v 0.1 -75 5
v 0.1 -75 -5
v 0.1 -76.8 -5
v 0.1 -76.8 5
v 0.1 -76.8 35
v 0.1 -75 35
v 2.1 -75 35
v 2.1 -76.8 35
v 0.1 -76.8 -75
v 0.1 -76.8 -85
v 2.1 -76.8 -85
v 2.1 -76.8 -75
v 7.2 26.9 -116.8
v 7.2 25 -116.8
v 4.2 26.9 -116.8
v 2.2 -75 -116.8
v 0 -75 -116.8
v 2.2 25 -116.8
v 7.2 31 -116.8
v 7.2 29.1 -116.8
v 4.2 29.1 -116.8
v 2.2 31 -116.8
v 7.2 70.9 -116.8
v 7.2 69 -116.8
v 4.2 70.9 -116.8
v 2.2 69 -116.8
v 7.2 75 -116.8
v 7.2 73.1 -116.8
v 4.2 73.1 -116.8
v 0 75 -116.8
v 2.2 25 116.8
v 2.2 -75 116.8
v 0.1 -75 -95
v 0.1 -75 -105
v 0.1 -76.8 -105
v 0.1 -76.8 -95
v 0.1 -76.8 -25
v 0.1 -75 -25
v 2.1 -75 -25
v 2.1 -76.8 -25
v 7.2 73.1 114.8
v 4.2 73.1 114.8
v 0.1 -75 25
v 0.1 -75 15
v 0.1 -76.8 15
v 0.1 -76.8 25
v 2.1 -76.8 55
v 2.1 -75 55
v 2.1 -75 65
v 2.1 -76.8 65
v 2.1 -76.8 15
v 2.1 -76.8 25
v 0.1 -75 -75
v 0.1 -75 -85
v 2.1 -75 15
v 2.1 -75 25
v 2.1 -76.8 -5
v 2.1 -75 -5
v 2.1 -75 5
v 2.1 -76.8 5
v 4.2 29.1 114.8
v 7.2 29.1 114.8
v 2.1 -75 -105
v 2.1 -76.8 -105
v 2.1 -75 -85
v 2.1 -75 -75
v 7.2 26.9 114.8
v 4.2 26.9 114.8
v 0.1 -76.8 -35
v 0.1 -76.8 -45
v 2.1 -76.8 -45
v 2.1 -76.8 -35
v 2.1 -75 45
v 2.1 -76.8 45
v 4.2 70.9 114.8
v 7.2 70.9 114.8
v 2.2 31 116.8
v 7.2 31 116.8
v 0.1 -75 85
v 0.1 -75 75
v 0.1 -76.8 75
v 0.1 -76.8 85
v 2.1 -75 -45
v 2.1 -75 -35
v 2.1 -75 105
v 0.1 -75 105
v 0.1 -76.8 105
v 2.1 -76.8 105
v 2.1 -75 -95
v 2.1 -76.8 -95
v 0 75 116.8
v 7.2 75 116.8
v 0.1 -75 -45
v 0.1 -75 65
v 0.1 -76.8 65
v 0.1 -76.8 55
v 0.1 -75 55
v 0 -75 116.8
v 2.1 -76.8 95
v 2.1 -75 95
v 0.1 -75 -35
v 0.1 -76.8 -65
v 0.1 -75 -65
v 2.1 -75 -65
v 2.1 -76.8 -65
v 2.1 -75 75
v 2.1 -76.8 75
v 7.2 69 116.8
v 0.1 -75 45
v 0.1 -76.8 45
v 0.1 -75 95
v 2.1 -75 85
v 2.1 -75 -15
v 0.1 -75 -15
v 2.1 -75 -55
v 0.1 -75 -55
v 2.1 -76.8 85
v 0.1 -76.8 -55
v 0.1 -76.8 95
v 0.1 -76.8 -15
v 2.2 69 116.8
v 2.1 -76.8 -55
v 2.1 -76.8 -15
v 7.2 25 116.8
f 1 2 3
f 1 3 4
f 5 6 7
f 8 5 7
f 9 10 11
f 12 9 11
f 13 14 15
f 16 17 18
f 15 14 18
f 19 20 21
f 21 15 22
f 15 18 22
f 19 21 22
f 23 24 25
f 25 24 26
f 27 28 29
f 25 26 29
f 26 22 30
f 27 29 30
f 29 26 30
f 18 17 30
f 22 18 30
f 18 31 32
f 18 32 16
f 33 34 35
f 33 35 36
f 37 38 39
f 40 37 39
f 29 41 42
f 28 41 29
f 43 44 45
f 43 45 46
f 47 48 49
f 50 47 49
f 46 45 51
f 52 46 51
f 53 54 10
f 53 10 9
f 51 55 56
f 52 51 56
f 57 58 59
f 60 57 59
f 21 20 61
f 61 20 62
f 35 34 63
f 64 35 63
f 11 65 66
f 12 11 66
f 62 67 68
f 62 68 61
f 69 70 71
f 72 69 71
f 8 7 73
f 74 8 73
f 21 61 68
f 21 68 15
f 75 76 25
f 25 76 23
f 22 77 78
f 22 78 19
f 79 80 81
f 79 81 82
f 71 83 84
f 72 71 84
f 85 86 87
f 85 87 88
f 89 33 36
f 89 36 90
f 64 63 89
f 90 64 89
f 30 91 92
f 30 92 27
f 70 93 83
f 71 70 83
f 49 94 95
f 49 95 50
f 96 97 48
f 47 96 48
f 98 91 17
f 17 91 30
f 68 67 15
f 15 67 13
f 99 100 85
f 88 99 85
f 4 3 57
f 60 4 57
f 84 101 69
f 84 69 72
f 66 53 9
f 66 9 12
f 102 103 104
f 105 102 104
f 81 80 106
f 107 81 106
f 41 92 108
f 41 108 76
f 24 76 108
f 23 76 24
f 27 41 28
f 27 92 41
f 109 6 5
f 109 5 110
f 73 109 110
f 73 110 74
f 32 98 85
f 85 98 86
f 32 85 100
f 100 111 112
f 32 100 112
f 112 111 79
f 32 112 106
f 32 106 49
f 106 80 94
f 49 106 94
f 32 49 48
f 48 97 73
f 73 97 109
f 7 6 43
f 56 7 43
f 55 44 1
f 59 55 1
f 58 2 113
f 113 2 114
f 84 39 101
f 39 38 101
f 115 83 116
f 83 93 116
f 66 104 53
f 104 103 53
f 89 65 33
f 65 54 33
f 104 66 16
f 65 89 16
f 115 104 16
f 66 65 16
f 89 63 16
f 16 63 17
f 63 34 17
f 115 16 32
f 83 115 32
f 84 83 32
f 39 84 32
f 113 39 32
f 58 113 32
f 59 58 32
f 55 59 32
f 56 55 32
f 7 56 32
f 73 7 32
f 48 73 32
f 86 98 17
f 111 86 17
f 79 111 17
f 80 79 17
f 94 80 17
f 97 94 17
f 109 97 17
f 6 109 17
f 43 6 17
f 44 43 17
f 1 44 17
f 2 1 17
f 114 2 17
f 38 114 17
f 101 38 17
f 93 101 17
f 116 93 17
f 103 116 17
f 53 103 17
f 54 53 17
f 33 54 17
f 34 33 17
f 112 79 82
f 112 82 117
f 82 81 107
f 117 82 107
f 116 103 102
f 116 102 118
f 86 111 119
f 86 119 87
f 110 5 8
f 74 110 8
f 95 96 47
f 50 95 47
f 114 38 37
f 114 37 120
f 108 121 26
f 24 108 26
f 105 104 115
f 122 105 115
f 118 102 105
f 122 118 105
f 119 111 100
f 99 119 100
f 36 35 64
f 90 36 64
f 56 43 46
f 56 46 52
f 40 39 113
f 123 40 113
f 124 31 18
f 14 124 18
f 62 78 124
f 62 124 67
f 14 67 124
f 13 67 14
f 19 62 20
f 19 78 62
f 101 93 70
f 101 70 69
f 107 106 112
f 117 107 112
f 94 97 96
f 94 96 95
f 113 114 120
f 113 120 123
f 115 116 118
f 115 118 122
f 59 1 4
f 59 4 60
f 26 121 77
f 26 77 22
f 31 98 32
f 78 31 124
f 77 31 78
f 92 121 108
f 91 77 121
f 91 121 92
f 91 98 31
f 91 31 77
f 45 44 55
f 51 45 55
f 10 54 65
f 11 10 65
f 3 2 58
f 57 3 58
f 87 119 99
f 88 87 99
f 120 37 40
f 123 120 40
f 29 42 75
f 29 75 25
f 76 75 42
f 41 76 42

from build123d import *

# Parameters (mm, degrees)
SKETCH_4_W          = 233.6
SKETCH_4_H          = 150
EXTRUDE_2_DEPTH     = 2.2
SKETCH_6_W          = 2
SKETCH_6_H          = 10
EXTRUDE_3_DEPTH     = 1.8
SKETCH_7_W          = 233.6
SKETCH_7_H          = 6
EXTRUDE_4_DEPTH     = 5
SKETCH_8_W          = 114.8
SKETCH_8_H          = 2.2
SKETCH_8_W_2        = 116.8
SKETCH_8_W_3        = 231.6
CUT_EXTRUDE_1_DEPTH = 3


with BuildPart() as part:
    # 草图4 → 凸台-拉伸2 (new body)
    with BuildSketch(Plane(origin=(0, 0, 0), x_dir=(0, 0, -1), z_dir=(1, 0, 0))):
        Rectangle(SKETCH_4_W, SKETCH_4_H)
    extrude(amount=EXTRUDE_2_DEPTH)

    # 草图6 → 凸台-拉伸3 (add)
    with BuildSketch(Plane.XZ.offset(75)):
        with Locations((1.1, 20)):
            Rectangle(SKETCH_6_W, SKETCH_6_H)
        with Locations((1.1, 0)):
            Rectangle(SKETCH_6_W, SKETCH_6_H)
        with Locations((1.1, 40)):
            Rectangle(SKETCH_6_W, SKETCH_6_H)
        with Locations((1.1, 60)):
            Rectangle(SKETCH_6_W, SKETCH_6_H)
        with Locations((1.1, 80)):
            Rectangle(SKETCH_6_W, SKETCH_6_H)
        with Locations((1.1, 100)):
            Rectangle(SKETCH_6_W, SKETCH_6_H)
        with Locations((1.1, -20)):
            Rectangle(SKETCH_6_W, SKETCH_6_H)
        with Locations((1.1, -40)):
            Rectangle(SKETCH_6_W, SKETCH_6_H)
        with Locations((1.1, -60)):
            Rectangle(SKETCH_6_W, SKETCH_6_H)
        with Locations((1.1, -80)):
            Rectangle(SKETCH_6_W, SKETCH_6_H)
        with Locations((1.1, -100)):
            Rectangle(SKETCH_6_W, SKETCH_6_H)
    extrude(amount=EXTRUDE_3_DEPTH)

    # 草图7 → 凸台-拉伸4 (add)
    with BuildSketch(Plane(origin=(2.2, 0, 0), x_dir=(0, 0, -1), z_dir=(1, 0, 0))):
        with Locations((0, 28)):
            Rectangle(SKETCH_7_W, SKETCH_7_H)
        with Locations((0, 72)):
            Rectangle(SKETCH_7_W, SKETCH_7_H)
    extrude(amount=EXTRUDE_4_DEPTH)

    # 草图8 → 切除-拉伸1 (cut)
    with BuildSketch(Plane(origin=(7.2, 0, 0), x_dir=(0, 0, -1), z_dir=(1, 0, 0))):
        with Locations((-57.4, 28)):
            Rectangle(SKETCH_8_W, SKETCH_8_H)
        with Locations((58.4, 28)):
            Rectangle(SKETCH_8_W_2, SKETCH_8_H)
        with Locations((1, 72)):
            Rectangle(SKETCH_8_W_3, SKETCH_8_H)
    extrude(amount=-CUT_EXTRUDE_1_DEPTH, mode=Mode.SUBTRACT)


solid = part.part
